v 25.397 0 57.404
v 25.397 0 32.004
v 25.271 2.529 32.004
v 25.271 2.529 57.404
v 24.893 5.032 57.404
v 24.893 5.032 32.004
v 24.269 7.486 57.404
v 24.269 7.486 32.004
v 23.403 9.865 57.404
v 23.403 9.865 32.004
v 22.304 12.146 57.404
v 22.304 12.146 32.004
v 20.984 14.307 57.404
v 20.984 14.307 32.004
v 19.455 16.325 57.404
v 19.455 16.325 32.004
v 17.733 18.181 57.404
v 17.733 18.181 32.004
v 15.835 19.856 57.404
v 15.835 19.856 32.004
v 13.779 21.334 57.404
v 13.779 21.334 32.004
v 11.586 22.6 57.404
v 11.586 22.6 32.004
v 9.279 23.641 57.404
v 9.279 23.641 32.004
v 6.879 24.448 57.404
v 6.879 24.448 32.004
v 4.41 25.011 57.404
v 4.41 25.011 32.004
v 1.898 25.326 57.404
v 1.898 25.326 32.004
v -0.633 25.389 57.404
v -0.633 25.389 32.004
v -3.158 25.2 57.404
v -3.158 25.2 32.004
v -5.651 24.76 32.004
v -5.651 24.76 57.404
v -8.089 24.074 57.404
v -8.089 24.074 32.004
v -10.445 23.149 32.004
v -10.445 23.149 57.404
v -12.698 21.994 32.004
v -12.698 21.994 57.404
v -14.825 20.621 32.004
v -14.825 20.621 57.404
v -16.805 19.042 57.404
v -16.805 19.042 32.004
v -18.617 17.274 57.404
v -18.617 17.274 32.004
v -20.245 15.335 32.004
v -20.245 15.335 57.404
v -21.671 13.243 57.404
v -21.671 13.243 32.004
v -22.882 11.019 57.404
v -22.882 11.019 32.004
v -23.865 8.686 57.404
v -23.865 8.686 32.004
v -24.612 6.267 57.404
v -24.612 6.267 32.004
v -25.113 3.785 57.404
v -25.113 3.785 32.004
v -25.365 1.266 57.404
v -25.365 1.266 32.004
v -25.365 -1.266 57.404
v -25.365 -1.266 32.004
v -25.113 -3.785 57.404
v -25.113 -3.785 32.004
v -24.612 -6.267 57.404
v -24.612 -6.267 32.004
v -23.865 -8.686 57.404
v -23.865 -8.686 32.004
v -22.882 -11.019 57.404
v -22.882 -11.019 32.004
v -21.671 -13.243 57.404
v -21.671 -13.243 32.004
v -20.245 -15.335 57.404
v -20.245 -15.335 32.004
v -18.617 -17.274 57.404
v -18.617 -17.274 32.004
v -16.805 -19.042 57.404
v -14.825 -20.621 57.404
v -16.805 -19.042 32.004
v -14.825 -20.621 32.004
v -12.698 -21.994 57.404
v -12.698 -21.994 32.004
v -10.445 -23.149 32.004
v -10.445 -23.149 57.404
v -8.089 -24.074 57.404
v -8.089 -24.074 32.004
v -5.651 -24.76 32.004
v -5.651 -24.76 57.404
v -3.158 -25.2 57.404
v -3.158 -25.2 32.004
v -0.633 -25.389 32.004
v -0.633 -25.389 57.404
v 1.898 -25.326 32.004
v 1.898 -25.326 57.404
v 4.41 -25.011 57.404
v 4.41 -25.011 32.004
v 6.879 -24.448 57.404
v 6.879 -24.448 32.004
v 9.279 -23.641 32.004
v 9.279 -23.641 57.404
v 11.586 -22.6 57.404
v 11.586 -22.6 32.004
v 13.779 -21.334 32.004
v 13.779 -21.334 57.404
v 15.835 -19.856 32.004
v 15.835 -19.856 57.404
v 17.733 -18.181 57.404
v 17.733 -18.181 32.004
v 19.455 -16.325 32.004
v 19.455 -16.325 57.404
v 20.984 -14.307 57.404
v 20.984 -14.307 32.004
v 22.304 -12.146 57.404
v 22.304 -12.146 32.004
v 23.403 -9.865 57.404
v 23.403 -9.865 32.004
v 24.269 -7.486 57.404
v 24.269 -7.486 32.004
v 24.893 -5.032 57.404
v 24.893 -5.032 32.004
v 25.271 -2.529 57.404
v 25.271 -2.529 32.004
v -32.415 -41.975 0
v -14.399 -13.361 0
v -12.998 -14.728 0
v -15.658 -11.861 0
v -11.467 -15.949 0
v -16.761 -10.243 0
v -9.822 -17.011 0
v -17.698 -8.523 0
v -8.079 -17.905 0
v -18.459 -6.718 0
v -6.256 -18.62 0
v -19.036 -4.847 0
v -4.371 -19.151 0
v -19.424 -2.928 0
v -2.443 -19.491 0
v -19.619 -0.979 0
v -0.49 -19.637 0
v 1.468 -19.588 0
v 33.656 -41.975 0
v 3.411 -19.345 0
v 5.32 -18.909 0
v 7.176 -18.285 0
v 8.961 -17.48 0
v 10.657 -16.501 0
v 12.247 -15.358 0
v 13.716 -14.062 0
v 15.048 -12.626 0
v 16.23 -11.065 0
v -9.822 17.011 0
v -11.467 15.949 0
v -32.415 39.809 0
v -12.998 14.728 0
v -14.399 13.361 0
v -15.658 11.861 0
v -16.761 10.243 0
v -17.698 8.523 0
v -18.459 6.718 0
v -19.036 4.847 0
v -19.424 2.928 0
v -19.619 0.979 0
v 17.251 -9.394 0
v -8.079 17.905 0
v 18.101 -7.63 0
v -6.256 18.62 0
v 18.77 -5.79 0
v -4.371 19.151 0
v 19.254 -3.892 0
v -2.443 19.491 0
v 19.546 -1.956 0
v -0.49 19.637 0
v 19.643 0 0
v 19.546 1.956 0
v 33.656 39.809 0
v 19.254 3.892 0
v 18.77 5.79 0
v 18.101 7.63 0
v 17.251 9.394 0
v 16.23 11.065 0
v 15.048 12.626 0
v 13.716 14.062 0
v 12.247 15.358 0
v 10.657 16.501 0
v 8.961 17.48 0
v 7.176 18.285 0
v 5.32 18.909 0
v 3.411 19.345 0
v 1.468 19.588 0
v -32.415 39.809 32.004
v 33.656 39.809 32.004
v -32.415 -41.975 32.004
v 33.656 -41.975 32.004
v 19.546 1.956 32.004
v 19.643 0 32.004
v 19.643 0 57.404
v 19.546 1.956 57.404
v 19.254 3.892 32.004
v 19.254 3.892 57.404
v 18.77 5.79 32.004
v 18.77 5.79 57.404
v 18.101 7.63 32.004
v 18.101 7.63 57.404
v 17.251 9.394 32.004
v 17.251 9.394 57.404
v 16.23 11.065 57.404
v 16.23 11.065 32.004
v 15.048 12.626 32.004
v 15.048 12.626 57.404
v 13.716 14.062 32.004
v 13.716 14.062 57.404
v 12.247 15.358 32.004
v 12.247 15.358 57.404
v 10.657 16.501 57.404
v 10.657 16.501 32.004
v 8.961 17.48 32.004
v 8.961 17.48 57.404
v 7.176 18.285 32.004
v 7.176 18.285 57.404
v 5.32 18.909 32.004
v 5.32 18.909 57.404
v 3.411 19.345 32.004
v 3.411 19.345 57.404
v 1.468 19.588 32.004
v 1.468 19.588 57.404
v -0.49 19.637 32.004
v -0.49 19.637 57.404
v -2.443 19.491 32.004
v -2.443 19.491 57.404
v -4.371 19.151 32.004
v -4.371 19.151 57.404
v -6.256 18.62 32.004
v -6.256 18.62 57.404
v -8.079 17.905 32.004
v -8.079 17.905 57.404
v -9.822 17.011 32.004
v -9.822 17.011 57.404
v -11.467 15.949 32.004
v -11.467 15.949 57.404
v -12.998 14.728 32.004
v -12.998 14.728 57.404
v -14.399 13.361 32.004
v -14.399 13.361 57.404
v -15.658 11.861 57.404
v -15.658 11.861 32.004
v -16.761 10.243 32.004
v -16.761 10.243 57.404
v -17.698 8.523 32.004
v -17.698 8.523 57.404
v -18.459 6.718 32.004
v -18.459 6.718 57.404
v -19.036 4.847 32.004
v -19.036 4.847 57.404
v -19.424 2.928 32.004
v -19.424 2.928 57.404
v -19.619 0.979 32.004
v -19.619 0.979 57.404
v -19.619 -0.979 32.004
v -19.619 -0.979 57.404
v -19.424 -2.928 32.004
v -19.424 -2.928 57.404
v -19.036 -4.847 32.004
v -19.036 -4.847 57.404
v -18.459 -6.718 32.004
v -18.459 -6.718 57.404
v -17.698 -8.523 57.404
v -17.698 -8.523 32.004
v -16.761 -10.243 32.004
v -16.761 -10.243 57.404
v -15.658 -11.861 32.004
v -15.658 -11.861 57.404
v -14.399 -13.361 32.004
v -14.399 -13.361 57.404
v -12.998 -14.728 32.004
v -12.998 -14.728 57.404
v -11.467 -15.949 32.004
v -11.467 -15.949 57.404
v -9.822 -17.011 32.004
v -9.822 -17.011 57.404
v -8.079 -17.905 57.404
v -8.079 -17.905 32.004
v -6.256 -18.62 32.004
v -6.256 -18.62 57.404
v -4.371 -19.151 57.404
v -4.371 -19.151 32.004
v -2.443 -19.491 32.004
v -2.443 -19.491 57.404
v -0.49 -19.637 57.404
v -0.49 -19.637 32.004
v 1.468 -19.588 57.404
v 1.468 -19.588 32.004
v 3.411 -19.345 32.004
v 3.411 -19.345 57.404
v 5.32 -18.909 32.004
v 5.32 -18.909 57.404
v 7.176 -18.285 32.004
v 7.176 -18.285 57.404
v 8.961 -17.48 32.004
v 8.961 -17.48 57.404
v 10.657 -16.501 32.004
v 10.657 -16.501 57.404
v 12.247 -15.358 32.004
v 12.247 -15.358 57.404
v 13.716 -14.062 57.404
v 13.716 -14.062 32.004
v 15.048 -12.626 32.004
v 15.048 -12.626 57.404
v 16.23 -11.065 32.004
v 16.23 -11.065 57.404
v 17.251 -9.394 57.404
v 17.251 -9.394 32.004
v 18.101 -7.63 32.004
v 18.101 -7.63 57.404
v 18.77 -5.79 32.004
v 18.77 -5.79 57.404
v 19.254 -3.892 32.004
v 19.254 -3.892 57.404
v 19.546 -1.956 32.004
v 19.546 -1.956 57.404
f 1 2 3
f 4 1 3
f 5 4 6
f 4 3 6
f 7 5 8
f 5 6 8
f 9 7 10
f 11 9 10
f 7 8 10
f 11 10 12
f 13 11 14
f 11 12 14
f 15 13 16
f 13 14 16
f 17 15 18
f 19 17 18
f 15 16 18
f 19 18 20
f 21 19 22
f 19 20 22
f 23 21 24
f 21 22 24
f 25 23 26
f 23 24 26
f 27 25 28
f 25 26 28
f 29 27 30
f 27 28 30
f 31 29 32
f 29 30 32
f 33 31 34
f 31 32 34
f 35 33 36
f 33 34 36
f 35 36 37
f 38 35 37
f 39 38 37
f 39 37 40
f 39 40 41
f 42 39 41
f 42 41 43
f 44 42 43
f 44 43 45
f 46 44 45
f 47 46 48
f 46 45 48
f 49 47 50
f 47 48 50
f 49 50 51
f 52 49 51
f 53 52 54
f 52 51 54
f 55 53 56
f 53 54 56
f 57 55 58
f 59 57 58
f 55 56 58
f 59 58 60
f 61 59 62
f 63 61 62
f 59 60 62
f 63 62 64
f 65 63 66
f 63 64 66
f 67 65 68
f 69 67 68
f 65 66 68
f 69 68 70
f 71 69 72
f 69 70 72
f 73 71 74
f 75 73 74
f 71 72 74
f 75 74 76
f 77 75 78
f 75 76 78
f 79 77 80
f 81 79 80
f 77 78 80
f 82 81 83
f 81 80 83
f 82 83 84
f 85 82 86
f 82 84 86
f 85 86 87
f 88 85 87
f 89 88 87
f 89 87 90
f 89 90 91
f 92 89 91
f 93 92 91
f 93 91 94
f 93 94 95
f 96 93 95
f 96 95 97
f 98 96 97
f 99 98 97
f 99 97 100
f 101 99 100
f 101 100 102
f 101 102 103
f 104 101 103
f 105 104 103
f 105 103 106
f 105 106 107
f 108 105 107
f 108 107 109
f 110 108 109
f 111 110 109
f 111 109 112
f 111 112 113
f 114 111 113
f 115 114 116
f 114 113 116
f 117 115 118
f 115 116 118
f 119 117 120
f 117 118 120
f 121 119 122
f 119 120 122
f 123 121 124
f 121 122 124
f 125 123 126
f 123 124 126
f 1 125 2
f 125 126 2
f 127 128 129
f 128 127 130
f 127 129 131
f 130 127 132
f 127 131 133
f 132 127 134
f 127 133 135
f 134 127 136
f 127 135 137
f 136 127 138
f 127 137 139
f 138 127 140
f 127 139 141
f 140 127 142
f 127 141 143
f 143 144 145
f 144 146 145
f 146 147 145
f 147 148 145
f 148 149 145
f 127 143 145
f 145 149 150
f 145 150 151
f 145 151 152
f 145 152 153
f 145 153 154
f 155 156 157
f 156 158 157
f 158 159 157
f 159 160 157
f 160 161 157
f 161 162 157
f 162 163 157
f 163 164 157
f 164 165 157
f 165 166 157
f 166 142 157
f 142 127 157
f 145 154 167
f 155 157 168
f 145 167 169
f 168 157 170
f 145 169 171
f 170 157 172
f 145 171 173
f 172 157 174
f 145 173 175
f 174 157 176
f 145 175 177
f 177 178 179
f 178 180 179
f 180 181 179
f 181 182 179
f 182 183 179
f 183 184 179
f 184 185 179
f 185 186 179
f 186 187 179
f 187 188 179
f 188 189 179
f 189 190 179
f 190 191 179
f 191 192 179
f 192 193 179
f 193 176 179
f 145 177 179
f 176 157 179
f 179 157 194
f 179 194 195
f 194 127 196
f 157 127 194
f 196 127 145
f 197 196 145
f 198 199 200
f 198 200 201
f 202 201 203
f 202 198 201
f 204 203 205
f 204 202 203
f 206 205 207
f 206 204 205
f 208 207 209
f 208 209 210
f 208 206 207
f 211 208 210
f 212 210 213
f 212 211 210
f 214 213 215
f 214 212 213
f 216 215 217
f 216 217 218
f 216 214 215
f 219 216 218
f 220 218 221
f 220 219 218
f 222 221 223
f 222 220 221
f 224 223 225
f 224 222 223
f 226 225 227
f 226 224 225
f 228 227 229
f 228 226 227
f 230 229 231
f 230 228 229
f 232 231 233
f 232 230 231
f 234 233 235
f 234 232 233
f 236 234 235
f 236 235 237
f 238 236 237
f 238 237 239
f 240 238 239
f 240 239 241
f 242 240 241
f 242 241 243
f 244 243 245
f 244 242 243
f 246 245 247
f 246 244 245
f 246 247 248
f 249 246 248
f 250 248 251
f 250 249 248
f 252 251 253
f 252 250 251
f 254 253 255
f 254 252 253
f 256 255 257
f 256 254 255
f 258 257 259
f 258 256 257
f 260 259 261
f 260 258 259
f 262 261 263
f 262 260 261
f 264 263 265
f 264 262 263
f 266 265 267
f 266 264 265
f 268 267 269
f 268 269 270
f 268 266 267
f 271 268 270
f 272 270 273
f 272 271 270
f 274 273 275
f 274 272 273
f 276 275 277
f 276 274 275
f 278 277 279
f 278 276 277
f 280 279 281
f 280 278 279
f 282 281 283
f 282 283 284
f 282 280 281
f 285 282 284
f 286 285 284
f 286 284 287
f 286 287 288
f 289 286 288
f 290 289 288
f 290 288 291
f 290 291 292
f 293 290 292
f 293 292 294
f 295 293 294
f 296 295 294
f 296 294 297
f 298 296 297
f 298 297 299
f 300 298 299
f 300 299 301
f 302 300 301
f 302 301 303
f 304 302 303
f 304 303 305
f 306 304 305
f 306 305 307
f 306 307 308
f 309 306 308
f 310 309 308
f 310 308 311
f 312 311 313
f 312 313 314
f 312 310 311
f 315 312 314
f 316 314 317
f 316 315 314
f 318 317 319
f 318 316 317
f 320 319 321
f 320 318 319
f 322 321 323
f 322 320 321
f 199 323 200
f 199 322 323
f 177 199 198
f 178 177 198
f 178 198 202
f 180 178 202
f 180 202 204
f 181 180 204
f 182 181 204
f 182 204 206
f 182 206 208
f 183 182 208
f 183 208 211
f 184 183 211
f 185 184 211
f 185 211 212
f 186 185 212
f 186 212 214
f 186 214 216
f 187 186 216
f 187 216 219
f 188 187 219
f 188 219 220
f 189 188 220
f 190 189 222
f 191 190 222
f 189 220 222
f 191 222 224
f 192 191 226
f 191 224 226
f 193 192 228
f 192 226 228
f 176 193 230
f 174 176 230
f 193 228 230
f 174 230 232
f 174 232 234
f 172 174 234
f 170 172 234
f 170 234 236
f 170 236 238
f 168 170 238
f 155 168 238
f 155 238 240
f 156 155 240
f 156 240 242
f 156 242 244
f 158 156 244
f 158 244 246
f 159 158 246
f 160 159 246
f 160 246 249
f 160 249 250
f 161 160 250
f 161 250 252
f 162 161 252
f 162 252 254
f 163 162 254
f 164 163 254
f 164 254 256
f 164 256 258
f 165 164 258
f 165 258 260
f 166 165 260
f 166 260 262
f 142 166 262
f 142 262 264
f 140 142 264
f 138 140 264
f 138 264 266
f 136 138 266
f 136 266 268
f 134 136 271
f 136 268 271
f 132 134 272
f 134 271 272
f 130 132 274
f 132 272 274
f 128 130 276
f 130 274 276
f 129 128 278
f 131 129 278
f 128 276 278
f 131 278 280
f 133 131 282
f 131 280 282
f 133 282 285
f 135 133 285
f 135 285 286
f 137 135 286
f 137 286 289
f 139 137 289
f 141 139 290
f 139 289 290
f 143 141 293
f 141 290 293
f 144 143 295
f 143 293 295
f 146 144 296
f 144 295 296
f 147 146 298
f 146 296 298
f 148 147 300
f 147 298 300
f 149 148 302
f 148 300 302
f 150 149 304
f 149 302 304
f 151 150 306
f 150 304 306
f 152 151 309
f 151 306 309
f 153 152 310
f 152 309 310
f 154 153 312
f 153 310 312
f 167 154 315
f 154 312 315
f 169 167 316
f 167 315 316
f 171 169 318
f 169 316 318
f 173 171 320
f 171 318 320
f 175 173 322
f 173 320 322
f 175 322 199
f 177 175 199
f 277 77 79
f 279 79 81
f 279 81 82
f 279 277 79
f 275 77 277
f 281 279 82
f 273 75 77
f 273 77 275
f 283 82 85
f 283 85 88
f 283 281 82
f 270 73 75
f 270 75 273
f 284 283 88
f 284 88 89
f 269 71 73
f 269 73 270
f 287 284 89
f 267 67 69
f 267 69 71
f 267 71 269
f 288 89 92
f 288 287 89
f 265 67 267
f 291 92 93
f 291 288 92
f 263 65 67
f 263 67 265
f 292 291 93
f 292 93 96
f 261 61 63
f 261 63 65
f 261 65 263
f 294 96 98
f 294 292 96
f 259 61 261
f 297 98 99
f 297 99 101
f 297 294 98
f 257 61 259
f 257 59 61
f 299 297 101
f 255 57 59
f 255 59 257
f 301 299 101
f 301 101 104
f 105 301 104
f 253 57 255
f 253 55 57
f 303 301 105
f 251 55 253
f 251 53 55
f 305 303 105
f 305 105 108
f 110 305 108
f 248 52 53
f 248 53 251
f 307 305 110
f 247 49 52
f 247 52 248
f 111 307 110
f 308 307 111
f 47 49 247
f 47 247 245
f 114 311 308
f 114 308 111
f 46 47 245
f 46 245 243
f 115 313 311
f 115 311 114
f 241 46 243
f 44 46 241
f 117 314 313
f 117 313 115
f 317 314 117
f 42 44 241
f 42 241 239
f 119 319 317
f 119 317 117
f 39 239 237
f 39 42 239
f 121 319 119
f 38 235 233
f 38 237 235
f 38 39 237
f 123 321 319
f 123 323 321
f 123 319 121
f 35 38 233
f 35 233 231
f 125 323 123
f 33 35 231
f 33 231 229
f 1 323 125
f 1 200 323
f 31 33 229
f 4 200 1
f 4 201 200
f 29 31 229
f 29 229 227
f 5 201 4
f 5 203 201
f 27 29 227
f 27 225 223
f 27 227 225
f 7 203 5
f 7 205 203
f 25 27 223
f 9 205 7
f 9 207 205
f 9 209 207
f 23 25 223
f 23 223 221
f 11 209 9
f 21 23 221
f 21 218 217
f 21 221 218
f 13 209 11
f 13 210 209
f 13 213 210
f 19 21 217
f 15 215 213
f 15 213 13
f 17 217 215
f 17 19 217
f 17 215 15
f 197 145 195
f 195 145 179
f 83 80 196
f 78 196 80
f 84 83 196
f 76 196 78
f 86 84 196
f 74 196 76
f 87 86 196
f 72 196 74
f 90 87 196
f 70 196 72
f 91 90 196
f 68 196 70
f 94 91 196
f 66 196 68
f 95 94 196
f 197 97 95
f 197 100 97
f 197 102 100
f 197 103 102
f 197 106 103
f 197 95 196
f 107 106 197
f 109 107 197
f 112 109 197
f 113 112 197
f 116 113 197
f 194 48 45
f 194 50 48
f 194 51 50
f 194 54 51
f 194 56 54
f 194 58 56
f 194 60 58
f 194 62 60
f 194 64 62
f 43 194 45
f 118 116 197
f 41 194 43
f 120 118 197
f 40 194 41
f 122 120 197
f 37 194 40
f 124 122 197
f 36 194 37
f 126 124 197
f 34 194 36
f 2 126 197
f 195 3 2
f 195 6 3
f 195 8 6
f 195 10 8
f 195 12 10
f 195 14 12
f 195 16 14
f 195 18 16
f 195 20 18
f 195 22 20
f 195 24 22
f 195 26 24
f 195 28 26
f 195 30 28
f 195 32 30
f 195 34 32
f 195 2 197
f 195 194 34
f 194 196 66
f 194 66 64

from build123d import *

# Parameters (mm, degrees)
F0_W     = 66.0715028644
F0_H     = 81.7836225033
F1_DEPTH = 32.004
F2_R     = 19.6431744844
F3_DEPTH = 63.246
F4_R     = 25.3969139416
F4_R_2   = 19.6431744844
F5_DEPTH = 25.4


with BuildPart() as f1:
    # F0 (on Top) → F1 (new body)
    with BuildSketch(Plane.XY):
        with Locations((0.6206892431, -1.0830126703)):
            Rectangle(F0_W, F0_H)
    extrude(amount=F1_DEPTH)

    # F2 (on face) → F3 (cut)
    with BuildSketch(Plane.XY.offset(32.004)):
        Circle(F2_R)
    extrude(amount=-F3_DEPTH, mode=Mode.SUBTRACT)

    # F4 (on face) → F5 (join)
    with BuildSketch(Plane.XY.offset(32.004)):
        Circle(F4_R)
        Circle(F4_R_2, mode=Mode.SUBTRACT)
    extrude(amount=F5_DEPTH)


solid = f1.part
